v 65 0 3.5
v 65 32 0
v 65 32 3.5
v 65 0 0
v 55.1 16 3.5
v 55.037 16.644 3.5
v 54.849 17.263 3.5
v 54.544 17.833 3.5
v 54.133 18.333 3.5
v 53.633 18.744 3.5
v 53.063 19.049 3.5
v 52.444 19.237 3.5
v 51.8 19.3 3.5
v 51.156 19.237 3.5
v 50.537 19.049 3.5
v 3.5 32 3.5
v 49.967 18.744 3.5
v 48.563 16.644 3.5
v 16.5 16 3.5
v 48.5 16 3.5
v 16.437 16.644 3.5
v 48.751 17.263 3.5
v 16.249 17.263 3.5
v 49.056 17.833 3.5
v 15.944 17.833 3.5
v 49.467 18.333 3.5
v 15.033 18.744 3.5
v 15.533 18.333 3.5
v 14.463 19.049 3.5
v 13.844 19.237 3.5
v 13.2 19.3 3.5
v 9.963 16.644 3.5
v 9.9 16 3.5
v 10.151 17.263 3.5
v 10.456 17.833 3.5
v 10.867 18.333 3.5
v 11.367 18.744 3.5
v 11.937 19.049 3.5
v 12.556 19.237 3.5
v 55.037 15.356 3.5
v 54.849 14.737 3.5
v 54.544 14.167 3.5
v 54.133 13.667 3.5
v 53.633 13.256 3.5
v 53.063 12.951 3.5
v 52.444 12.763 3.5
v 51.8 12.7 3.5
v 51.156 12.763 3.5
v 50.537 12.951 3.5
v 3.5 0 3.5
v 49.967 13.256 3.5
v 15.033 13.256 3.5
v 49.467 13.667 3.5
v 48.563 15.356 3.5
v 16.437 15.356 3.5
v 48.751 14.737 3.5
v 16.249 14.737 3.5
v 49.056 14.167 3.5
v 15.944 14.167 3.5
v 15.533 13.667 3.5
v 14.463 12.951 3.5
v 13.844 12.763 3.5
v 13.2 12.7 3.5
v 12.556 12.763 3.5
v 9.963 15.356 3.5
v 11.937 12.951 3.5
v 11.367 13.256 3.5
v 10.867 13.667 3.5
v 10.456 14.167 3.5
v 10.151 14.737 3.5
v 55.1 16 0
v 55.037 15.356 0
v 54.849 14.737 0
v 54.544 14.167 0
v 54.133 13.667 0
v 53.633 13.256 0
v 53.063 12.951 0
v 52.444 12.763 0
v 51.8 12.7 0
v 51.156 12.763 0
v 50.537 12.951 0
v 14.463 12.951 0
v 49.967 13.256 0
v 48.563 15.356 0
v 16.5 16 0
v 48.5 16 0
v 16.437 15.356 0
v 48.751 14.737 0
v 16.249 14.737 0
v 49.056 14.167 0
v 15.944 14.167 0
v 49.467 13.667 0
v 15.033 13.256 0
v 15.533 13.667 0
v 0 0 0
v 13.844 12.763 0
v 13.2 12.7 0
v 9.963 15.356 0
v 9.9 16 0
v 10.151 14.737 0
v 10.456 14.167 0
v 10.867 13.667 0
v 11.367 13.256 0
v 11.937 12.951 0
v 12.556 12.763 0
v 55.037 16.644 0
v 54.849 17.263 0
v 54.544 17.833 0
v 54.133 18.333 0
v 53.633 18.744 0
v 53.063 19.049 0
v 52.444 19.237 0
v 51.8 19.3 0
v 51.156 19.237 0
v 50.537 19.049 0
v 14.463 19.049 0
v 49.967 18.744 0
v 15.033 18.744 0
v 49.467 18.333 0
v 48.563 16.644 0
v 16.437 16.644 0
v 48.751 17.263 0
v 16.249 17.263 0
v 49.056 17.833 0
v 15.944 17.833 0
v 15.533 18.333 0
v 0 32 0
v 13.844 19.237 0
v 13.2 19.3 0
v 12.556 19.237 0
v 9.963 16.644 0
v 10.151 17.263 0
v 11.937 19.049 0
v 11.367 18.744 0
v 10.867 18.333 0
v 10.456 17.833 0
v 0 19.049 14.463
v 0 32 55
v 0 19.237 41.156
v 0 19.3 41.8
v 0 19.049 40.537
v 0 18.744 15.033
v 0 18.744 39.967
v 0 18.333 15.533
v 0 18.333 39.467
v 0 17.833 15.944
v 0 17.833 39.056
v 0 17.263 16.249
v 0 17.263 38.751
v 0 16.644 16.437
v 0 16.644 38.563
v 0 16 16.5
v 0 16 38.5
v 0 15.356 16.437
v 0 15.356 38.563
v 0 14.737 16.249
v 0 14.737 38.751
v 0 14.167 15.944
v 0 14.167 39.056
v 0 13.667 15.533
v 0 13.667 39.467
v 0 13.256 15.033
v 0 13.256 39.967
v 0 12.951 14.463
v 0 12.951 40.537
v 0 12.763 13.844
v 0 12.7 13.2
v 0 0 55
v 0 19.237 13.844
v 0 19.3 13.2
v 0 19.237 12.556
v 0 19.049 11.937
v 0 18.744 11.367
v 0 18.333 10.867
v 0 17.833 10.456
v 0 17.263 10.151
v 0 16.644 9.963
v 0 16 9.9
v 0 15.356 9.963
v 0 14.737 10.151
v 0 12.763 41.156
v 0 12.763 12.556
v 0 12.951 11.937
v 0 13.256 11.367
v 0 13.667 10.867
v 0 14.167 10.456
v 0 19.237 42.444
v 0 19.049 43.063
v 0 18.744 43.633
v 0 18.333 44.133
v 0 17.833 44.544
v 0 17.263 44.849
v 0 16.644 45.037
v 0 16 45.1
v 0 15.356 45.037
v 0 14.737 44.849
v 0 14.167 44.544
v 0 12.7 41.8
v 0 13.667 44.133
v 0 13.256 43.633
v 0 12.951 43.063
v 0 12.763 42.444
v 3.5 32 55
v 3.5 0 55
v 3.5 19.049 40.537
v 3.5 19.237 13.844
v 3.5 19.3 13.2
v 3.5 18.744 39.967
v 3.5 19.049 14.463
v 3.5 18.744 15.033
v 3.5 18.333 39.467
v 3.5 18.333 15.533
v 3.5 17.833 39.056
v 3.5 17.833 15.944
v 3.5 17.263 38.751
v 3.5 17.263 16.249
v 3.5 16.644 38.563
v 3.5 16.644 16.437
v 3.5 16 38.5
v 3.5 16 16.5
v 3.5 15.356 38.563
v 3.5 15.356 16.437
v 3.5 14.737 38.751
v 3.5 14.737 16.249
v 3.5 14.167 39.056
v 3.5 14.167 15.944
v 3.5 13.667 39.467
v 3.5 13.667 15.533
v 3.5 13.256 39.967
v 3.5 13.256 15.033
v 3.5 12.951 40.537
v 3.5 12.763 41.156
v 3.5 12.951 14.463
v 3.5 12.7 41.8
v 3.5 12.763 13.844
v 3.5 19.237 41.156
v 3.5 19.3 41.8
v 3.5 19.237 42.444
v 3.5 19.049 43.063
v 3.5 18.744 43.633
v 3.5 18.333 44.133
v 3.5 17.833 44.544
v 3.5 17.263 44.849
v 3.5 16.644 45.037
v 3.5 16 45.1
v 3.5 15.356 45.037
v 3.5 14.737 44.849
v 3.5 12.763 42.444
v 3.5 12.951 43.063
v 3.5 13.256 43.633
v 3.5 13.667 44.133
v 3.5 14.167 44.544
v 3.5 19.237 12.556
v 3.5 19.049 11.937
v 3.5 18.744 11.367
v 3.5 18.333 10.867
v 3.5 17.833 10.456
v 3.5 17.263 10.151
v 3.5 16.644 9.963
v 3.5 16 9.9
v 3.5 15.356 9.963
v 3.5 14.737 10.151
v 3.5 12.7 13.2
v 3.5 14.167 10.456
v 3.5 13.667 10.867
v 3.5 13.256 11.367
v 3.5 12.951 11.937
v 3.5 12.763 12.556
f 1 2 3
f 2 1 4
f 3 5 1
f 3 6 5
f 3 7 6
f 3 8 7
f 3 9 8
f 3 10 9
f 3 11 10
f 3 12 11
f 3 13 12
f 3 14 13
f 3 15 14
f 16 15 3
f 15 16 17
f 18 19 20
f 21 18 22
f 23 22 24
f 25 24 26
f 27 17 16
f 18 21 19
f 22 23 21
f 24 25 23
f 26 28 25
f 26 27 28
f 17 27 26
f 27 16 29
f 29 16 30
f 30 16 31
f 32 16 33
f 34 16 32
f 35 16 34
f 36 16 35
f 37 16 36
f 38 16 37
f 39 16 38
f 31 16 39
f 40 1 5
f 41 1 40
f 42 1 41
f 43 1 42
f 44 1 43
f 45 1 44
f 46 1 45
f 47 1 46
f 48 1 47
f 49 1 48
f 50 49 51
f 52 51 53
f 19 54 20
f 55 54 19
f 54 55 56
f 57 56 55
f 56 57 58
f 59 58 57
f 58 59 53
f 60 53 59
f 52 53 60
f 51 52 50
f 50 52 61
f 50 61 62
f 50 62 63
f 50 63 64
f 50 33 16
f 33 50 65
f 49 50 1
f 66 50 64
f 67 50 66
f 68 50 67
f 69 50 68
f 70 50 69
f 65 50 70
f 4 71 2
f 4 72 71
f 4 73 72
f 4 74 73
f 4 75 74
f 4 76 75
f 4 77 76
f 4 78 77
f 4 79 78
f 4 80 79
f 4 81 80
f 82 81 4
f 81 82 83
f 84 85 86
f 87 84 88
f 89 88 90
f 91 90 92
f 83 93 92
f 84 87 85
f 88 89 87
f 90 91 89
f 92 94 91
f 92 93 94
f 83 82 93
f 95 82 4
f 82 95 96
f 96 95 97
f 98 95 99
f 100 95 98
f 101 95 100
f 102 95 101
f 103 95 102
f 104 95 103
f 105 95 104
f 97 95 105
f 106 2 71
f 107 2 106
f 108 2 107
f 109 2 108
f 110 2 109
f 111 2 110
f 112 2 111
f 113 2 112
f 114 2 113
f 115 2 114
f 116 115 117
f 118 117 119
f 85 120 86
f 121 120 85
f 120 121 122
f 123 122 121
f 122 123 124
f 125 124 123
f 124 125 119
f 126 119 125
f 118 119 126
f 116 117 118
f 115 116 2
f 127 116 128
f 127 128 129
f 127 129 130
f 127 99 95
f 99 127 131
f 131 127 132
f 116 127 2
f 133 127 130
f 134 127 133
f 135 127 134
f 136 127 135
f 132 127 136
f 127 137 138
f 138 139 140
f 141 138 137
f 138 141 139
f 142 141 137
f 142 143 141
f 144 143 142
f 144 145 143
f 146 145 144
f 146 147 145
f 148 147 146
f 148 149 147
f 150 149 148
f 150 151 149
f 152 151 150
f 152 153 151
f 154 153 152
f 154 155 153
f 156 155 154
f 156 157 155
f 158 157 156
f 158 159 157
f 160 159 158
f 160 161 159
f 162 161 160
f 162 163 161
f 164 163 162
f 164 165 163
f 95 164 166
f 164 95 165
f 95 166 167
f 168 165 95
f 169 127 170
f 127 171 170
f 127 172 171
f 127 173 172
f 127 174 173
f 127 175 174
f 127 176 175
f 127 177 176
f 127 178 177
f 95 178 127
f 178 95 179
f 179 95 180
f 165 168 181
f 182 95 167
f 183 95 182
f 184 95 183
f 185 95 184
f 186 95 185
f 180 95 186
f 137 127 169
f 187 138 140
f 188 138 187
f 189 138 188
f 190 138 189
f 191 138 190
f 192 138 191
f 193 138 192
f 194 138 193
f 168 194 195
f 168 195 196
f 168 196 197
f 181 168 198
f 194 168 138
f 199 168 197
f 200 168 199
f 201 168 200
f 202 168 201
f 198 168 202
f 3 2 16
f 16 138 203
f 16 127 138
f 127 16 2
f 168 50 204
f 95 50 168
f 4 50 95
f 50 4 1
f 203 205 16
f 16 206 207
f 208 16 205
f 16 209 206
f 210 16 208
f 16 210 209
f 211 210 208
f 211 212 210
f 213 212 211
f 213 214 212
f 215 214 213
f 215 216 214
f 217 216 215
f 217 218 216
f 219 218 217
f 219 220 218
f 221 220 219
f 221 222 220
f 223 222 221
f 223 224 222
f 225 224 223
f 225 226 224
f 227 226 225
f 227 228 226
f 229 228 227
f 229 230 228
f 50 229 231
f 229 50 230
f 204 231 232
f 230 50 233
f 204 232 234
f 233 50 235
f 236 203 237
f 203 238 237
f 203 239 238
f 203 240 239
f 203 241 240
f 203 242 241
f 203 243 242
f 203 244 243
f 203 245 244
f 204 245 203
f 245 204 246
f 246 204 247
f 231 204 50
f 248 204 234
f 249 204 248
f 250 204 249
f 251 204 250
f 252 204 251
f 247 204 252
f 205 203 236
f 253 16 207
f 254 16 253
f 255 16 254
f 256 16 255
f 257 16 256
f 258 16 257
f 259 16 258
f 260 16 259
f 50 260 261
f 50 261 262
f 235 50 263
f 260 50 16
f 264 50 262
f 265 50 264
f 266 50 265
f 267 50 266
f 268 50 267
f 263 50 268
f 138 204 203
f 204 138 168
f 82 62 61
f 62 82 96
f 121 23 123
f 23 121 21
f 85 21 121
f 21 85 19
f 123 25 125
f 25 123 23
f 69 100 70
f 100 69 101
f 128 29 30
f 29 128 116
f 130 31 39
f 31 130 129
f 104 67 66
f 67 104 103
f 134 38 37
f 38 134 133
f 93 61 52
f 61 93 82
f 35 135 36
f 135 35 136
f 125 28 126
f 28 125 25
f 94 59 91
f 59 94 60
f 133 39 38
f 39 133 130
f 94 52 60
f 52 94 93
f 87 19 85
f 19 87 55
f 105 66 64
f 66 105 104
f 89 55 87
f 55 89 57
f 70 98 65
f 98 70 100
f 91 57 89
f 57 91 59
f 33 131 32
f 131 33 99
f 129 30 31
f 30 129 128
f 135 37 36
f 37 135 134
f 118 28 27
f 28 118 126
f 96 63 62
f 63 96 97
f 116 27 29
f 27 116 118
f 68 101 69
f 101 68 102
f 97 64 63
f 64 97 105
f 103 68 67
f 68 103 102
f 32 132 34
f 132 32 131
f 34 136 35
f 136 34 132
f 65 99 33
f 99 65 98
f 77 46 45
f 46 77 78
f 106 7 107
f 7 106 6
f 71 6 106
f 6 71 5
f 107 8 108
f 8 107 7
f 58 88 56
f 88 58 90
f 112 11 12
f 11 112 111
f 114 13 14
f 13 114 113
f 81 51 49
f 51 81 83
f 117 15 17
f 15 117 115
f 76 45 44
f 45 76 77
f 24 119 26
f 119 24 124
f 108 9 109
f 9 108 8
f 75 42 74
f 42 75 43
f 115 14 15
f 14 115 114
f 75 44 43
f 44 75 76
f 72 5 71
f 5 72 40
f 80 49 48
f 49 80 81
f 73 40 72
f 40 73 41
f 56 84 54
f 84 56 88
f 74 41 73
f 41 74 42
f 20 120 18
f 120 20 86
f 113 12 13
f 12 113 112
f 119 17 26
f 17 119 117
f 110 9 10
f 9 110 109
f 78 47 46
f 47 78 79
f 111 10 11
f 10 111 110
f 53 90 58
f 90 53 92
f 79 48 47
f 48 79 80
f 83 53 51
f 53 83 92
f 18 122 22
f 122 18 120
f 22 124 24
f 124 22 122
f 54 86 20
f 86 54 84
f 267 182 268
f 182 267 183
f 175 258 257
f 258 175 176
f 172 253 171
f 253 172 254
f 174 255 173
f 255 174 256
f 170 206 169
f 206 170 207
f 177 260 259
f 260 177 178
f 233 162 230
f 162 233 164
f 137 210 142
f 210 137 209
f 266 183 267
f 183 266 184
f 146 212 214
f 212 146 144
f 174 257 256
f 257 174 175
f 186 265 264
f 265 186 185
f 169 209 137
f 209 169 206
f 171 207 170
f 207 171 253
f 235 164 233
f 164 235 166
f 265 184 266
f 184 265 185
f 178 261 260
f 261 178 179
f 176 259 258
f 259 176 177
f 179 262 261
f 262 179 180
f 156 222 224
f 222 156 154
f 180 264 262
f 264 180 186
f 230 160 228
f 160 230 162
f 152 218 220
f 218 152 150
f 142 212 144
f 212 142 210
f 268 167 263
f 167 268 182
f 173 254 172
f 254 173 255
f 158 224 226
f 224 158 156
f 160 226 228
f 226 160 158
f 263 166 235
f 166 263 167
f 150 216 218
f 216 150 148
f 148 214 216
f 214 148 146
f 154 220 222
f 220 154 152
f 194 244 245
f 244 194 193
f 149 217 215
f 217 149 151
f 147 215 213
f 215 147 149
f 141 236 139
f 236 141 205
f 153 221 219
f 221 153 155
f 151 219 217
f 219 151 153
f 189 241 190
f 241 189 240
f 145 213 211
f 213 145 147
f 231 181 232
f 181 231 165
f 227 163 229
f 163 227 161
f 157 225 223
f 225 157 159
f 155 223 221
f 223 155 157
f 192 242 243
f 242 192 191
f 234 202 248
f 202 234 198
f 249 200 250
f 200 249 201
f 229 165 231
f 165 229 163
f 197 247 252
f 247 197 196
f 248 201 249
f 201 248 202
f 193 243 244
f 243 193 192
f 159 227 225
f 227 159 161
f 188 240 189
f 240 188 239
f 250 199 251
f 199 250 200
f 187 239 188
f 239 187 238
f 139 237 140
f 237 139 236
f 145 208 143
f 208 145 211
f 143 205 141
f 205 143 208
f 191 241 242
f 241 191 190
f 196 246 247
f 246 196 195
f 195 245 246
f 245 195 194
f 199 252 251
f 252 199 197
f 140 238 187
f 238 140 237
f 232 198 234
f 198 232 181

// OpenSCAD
$fn = 32;

// ----------------------------------------------------------------------
// L-bracket: 65 x 32 x 55 mm
// ----------------------------------------------------------------------

// --- parameters (mm) ---
horiz_len = 65;           // horizontal leg, X
vert_len = 55;            // vertical leg, Z
profile_w = 32;           // bracket depth, Y
plate_t = 3.5;            // plate thickness
hole_d = 6.6;             // clearance for M6

module hole_z(px, py) {
  translate([px, py, -0.5]) cylinder(h = plate_t + 1, d = hole_d);
}
module hole_x(pz, py) {
  translate([-0.5, py, pz]) rotate([0, 90, 0]) cylinder(h = plate_t + 1, d = hole_d);
}

difference() {
  union() {
    /* horizontal leg */
    cube([horiz_len, profile_w, plate_t]);
    /* vertical leg, overlapping the corner block */
    cube([plate_t, profile_w, vert_len]);
  }
  hole_z(13.2, 16);
  hole_z(51.8, 16);
  hole_x(13.2, 16);
  hole_x(41.8, 16);
}
